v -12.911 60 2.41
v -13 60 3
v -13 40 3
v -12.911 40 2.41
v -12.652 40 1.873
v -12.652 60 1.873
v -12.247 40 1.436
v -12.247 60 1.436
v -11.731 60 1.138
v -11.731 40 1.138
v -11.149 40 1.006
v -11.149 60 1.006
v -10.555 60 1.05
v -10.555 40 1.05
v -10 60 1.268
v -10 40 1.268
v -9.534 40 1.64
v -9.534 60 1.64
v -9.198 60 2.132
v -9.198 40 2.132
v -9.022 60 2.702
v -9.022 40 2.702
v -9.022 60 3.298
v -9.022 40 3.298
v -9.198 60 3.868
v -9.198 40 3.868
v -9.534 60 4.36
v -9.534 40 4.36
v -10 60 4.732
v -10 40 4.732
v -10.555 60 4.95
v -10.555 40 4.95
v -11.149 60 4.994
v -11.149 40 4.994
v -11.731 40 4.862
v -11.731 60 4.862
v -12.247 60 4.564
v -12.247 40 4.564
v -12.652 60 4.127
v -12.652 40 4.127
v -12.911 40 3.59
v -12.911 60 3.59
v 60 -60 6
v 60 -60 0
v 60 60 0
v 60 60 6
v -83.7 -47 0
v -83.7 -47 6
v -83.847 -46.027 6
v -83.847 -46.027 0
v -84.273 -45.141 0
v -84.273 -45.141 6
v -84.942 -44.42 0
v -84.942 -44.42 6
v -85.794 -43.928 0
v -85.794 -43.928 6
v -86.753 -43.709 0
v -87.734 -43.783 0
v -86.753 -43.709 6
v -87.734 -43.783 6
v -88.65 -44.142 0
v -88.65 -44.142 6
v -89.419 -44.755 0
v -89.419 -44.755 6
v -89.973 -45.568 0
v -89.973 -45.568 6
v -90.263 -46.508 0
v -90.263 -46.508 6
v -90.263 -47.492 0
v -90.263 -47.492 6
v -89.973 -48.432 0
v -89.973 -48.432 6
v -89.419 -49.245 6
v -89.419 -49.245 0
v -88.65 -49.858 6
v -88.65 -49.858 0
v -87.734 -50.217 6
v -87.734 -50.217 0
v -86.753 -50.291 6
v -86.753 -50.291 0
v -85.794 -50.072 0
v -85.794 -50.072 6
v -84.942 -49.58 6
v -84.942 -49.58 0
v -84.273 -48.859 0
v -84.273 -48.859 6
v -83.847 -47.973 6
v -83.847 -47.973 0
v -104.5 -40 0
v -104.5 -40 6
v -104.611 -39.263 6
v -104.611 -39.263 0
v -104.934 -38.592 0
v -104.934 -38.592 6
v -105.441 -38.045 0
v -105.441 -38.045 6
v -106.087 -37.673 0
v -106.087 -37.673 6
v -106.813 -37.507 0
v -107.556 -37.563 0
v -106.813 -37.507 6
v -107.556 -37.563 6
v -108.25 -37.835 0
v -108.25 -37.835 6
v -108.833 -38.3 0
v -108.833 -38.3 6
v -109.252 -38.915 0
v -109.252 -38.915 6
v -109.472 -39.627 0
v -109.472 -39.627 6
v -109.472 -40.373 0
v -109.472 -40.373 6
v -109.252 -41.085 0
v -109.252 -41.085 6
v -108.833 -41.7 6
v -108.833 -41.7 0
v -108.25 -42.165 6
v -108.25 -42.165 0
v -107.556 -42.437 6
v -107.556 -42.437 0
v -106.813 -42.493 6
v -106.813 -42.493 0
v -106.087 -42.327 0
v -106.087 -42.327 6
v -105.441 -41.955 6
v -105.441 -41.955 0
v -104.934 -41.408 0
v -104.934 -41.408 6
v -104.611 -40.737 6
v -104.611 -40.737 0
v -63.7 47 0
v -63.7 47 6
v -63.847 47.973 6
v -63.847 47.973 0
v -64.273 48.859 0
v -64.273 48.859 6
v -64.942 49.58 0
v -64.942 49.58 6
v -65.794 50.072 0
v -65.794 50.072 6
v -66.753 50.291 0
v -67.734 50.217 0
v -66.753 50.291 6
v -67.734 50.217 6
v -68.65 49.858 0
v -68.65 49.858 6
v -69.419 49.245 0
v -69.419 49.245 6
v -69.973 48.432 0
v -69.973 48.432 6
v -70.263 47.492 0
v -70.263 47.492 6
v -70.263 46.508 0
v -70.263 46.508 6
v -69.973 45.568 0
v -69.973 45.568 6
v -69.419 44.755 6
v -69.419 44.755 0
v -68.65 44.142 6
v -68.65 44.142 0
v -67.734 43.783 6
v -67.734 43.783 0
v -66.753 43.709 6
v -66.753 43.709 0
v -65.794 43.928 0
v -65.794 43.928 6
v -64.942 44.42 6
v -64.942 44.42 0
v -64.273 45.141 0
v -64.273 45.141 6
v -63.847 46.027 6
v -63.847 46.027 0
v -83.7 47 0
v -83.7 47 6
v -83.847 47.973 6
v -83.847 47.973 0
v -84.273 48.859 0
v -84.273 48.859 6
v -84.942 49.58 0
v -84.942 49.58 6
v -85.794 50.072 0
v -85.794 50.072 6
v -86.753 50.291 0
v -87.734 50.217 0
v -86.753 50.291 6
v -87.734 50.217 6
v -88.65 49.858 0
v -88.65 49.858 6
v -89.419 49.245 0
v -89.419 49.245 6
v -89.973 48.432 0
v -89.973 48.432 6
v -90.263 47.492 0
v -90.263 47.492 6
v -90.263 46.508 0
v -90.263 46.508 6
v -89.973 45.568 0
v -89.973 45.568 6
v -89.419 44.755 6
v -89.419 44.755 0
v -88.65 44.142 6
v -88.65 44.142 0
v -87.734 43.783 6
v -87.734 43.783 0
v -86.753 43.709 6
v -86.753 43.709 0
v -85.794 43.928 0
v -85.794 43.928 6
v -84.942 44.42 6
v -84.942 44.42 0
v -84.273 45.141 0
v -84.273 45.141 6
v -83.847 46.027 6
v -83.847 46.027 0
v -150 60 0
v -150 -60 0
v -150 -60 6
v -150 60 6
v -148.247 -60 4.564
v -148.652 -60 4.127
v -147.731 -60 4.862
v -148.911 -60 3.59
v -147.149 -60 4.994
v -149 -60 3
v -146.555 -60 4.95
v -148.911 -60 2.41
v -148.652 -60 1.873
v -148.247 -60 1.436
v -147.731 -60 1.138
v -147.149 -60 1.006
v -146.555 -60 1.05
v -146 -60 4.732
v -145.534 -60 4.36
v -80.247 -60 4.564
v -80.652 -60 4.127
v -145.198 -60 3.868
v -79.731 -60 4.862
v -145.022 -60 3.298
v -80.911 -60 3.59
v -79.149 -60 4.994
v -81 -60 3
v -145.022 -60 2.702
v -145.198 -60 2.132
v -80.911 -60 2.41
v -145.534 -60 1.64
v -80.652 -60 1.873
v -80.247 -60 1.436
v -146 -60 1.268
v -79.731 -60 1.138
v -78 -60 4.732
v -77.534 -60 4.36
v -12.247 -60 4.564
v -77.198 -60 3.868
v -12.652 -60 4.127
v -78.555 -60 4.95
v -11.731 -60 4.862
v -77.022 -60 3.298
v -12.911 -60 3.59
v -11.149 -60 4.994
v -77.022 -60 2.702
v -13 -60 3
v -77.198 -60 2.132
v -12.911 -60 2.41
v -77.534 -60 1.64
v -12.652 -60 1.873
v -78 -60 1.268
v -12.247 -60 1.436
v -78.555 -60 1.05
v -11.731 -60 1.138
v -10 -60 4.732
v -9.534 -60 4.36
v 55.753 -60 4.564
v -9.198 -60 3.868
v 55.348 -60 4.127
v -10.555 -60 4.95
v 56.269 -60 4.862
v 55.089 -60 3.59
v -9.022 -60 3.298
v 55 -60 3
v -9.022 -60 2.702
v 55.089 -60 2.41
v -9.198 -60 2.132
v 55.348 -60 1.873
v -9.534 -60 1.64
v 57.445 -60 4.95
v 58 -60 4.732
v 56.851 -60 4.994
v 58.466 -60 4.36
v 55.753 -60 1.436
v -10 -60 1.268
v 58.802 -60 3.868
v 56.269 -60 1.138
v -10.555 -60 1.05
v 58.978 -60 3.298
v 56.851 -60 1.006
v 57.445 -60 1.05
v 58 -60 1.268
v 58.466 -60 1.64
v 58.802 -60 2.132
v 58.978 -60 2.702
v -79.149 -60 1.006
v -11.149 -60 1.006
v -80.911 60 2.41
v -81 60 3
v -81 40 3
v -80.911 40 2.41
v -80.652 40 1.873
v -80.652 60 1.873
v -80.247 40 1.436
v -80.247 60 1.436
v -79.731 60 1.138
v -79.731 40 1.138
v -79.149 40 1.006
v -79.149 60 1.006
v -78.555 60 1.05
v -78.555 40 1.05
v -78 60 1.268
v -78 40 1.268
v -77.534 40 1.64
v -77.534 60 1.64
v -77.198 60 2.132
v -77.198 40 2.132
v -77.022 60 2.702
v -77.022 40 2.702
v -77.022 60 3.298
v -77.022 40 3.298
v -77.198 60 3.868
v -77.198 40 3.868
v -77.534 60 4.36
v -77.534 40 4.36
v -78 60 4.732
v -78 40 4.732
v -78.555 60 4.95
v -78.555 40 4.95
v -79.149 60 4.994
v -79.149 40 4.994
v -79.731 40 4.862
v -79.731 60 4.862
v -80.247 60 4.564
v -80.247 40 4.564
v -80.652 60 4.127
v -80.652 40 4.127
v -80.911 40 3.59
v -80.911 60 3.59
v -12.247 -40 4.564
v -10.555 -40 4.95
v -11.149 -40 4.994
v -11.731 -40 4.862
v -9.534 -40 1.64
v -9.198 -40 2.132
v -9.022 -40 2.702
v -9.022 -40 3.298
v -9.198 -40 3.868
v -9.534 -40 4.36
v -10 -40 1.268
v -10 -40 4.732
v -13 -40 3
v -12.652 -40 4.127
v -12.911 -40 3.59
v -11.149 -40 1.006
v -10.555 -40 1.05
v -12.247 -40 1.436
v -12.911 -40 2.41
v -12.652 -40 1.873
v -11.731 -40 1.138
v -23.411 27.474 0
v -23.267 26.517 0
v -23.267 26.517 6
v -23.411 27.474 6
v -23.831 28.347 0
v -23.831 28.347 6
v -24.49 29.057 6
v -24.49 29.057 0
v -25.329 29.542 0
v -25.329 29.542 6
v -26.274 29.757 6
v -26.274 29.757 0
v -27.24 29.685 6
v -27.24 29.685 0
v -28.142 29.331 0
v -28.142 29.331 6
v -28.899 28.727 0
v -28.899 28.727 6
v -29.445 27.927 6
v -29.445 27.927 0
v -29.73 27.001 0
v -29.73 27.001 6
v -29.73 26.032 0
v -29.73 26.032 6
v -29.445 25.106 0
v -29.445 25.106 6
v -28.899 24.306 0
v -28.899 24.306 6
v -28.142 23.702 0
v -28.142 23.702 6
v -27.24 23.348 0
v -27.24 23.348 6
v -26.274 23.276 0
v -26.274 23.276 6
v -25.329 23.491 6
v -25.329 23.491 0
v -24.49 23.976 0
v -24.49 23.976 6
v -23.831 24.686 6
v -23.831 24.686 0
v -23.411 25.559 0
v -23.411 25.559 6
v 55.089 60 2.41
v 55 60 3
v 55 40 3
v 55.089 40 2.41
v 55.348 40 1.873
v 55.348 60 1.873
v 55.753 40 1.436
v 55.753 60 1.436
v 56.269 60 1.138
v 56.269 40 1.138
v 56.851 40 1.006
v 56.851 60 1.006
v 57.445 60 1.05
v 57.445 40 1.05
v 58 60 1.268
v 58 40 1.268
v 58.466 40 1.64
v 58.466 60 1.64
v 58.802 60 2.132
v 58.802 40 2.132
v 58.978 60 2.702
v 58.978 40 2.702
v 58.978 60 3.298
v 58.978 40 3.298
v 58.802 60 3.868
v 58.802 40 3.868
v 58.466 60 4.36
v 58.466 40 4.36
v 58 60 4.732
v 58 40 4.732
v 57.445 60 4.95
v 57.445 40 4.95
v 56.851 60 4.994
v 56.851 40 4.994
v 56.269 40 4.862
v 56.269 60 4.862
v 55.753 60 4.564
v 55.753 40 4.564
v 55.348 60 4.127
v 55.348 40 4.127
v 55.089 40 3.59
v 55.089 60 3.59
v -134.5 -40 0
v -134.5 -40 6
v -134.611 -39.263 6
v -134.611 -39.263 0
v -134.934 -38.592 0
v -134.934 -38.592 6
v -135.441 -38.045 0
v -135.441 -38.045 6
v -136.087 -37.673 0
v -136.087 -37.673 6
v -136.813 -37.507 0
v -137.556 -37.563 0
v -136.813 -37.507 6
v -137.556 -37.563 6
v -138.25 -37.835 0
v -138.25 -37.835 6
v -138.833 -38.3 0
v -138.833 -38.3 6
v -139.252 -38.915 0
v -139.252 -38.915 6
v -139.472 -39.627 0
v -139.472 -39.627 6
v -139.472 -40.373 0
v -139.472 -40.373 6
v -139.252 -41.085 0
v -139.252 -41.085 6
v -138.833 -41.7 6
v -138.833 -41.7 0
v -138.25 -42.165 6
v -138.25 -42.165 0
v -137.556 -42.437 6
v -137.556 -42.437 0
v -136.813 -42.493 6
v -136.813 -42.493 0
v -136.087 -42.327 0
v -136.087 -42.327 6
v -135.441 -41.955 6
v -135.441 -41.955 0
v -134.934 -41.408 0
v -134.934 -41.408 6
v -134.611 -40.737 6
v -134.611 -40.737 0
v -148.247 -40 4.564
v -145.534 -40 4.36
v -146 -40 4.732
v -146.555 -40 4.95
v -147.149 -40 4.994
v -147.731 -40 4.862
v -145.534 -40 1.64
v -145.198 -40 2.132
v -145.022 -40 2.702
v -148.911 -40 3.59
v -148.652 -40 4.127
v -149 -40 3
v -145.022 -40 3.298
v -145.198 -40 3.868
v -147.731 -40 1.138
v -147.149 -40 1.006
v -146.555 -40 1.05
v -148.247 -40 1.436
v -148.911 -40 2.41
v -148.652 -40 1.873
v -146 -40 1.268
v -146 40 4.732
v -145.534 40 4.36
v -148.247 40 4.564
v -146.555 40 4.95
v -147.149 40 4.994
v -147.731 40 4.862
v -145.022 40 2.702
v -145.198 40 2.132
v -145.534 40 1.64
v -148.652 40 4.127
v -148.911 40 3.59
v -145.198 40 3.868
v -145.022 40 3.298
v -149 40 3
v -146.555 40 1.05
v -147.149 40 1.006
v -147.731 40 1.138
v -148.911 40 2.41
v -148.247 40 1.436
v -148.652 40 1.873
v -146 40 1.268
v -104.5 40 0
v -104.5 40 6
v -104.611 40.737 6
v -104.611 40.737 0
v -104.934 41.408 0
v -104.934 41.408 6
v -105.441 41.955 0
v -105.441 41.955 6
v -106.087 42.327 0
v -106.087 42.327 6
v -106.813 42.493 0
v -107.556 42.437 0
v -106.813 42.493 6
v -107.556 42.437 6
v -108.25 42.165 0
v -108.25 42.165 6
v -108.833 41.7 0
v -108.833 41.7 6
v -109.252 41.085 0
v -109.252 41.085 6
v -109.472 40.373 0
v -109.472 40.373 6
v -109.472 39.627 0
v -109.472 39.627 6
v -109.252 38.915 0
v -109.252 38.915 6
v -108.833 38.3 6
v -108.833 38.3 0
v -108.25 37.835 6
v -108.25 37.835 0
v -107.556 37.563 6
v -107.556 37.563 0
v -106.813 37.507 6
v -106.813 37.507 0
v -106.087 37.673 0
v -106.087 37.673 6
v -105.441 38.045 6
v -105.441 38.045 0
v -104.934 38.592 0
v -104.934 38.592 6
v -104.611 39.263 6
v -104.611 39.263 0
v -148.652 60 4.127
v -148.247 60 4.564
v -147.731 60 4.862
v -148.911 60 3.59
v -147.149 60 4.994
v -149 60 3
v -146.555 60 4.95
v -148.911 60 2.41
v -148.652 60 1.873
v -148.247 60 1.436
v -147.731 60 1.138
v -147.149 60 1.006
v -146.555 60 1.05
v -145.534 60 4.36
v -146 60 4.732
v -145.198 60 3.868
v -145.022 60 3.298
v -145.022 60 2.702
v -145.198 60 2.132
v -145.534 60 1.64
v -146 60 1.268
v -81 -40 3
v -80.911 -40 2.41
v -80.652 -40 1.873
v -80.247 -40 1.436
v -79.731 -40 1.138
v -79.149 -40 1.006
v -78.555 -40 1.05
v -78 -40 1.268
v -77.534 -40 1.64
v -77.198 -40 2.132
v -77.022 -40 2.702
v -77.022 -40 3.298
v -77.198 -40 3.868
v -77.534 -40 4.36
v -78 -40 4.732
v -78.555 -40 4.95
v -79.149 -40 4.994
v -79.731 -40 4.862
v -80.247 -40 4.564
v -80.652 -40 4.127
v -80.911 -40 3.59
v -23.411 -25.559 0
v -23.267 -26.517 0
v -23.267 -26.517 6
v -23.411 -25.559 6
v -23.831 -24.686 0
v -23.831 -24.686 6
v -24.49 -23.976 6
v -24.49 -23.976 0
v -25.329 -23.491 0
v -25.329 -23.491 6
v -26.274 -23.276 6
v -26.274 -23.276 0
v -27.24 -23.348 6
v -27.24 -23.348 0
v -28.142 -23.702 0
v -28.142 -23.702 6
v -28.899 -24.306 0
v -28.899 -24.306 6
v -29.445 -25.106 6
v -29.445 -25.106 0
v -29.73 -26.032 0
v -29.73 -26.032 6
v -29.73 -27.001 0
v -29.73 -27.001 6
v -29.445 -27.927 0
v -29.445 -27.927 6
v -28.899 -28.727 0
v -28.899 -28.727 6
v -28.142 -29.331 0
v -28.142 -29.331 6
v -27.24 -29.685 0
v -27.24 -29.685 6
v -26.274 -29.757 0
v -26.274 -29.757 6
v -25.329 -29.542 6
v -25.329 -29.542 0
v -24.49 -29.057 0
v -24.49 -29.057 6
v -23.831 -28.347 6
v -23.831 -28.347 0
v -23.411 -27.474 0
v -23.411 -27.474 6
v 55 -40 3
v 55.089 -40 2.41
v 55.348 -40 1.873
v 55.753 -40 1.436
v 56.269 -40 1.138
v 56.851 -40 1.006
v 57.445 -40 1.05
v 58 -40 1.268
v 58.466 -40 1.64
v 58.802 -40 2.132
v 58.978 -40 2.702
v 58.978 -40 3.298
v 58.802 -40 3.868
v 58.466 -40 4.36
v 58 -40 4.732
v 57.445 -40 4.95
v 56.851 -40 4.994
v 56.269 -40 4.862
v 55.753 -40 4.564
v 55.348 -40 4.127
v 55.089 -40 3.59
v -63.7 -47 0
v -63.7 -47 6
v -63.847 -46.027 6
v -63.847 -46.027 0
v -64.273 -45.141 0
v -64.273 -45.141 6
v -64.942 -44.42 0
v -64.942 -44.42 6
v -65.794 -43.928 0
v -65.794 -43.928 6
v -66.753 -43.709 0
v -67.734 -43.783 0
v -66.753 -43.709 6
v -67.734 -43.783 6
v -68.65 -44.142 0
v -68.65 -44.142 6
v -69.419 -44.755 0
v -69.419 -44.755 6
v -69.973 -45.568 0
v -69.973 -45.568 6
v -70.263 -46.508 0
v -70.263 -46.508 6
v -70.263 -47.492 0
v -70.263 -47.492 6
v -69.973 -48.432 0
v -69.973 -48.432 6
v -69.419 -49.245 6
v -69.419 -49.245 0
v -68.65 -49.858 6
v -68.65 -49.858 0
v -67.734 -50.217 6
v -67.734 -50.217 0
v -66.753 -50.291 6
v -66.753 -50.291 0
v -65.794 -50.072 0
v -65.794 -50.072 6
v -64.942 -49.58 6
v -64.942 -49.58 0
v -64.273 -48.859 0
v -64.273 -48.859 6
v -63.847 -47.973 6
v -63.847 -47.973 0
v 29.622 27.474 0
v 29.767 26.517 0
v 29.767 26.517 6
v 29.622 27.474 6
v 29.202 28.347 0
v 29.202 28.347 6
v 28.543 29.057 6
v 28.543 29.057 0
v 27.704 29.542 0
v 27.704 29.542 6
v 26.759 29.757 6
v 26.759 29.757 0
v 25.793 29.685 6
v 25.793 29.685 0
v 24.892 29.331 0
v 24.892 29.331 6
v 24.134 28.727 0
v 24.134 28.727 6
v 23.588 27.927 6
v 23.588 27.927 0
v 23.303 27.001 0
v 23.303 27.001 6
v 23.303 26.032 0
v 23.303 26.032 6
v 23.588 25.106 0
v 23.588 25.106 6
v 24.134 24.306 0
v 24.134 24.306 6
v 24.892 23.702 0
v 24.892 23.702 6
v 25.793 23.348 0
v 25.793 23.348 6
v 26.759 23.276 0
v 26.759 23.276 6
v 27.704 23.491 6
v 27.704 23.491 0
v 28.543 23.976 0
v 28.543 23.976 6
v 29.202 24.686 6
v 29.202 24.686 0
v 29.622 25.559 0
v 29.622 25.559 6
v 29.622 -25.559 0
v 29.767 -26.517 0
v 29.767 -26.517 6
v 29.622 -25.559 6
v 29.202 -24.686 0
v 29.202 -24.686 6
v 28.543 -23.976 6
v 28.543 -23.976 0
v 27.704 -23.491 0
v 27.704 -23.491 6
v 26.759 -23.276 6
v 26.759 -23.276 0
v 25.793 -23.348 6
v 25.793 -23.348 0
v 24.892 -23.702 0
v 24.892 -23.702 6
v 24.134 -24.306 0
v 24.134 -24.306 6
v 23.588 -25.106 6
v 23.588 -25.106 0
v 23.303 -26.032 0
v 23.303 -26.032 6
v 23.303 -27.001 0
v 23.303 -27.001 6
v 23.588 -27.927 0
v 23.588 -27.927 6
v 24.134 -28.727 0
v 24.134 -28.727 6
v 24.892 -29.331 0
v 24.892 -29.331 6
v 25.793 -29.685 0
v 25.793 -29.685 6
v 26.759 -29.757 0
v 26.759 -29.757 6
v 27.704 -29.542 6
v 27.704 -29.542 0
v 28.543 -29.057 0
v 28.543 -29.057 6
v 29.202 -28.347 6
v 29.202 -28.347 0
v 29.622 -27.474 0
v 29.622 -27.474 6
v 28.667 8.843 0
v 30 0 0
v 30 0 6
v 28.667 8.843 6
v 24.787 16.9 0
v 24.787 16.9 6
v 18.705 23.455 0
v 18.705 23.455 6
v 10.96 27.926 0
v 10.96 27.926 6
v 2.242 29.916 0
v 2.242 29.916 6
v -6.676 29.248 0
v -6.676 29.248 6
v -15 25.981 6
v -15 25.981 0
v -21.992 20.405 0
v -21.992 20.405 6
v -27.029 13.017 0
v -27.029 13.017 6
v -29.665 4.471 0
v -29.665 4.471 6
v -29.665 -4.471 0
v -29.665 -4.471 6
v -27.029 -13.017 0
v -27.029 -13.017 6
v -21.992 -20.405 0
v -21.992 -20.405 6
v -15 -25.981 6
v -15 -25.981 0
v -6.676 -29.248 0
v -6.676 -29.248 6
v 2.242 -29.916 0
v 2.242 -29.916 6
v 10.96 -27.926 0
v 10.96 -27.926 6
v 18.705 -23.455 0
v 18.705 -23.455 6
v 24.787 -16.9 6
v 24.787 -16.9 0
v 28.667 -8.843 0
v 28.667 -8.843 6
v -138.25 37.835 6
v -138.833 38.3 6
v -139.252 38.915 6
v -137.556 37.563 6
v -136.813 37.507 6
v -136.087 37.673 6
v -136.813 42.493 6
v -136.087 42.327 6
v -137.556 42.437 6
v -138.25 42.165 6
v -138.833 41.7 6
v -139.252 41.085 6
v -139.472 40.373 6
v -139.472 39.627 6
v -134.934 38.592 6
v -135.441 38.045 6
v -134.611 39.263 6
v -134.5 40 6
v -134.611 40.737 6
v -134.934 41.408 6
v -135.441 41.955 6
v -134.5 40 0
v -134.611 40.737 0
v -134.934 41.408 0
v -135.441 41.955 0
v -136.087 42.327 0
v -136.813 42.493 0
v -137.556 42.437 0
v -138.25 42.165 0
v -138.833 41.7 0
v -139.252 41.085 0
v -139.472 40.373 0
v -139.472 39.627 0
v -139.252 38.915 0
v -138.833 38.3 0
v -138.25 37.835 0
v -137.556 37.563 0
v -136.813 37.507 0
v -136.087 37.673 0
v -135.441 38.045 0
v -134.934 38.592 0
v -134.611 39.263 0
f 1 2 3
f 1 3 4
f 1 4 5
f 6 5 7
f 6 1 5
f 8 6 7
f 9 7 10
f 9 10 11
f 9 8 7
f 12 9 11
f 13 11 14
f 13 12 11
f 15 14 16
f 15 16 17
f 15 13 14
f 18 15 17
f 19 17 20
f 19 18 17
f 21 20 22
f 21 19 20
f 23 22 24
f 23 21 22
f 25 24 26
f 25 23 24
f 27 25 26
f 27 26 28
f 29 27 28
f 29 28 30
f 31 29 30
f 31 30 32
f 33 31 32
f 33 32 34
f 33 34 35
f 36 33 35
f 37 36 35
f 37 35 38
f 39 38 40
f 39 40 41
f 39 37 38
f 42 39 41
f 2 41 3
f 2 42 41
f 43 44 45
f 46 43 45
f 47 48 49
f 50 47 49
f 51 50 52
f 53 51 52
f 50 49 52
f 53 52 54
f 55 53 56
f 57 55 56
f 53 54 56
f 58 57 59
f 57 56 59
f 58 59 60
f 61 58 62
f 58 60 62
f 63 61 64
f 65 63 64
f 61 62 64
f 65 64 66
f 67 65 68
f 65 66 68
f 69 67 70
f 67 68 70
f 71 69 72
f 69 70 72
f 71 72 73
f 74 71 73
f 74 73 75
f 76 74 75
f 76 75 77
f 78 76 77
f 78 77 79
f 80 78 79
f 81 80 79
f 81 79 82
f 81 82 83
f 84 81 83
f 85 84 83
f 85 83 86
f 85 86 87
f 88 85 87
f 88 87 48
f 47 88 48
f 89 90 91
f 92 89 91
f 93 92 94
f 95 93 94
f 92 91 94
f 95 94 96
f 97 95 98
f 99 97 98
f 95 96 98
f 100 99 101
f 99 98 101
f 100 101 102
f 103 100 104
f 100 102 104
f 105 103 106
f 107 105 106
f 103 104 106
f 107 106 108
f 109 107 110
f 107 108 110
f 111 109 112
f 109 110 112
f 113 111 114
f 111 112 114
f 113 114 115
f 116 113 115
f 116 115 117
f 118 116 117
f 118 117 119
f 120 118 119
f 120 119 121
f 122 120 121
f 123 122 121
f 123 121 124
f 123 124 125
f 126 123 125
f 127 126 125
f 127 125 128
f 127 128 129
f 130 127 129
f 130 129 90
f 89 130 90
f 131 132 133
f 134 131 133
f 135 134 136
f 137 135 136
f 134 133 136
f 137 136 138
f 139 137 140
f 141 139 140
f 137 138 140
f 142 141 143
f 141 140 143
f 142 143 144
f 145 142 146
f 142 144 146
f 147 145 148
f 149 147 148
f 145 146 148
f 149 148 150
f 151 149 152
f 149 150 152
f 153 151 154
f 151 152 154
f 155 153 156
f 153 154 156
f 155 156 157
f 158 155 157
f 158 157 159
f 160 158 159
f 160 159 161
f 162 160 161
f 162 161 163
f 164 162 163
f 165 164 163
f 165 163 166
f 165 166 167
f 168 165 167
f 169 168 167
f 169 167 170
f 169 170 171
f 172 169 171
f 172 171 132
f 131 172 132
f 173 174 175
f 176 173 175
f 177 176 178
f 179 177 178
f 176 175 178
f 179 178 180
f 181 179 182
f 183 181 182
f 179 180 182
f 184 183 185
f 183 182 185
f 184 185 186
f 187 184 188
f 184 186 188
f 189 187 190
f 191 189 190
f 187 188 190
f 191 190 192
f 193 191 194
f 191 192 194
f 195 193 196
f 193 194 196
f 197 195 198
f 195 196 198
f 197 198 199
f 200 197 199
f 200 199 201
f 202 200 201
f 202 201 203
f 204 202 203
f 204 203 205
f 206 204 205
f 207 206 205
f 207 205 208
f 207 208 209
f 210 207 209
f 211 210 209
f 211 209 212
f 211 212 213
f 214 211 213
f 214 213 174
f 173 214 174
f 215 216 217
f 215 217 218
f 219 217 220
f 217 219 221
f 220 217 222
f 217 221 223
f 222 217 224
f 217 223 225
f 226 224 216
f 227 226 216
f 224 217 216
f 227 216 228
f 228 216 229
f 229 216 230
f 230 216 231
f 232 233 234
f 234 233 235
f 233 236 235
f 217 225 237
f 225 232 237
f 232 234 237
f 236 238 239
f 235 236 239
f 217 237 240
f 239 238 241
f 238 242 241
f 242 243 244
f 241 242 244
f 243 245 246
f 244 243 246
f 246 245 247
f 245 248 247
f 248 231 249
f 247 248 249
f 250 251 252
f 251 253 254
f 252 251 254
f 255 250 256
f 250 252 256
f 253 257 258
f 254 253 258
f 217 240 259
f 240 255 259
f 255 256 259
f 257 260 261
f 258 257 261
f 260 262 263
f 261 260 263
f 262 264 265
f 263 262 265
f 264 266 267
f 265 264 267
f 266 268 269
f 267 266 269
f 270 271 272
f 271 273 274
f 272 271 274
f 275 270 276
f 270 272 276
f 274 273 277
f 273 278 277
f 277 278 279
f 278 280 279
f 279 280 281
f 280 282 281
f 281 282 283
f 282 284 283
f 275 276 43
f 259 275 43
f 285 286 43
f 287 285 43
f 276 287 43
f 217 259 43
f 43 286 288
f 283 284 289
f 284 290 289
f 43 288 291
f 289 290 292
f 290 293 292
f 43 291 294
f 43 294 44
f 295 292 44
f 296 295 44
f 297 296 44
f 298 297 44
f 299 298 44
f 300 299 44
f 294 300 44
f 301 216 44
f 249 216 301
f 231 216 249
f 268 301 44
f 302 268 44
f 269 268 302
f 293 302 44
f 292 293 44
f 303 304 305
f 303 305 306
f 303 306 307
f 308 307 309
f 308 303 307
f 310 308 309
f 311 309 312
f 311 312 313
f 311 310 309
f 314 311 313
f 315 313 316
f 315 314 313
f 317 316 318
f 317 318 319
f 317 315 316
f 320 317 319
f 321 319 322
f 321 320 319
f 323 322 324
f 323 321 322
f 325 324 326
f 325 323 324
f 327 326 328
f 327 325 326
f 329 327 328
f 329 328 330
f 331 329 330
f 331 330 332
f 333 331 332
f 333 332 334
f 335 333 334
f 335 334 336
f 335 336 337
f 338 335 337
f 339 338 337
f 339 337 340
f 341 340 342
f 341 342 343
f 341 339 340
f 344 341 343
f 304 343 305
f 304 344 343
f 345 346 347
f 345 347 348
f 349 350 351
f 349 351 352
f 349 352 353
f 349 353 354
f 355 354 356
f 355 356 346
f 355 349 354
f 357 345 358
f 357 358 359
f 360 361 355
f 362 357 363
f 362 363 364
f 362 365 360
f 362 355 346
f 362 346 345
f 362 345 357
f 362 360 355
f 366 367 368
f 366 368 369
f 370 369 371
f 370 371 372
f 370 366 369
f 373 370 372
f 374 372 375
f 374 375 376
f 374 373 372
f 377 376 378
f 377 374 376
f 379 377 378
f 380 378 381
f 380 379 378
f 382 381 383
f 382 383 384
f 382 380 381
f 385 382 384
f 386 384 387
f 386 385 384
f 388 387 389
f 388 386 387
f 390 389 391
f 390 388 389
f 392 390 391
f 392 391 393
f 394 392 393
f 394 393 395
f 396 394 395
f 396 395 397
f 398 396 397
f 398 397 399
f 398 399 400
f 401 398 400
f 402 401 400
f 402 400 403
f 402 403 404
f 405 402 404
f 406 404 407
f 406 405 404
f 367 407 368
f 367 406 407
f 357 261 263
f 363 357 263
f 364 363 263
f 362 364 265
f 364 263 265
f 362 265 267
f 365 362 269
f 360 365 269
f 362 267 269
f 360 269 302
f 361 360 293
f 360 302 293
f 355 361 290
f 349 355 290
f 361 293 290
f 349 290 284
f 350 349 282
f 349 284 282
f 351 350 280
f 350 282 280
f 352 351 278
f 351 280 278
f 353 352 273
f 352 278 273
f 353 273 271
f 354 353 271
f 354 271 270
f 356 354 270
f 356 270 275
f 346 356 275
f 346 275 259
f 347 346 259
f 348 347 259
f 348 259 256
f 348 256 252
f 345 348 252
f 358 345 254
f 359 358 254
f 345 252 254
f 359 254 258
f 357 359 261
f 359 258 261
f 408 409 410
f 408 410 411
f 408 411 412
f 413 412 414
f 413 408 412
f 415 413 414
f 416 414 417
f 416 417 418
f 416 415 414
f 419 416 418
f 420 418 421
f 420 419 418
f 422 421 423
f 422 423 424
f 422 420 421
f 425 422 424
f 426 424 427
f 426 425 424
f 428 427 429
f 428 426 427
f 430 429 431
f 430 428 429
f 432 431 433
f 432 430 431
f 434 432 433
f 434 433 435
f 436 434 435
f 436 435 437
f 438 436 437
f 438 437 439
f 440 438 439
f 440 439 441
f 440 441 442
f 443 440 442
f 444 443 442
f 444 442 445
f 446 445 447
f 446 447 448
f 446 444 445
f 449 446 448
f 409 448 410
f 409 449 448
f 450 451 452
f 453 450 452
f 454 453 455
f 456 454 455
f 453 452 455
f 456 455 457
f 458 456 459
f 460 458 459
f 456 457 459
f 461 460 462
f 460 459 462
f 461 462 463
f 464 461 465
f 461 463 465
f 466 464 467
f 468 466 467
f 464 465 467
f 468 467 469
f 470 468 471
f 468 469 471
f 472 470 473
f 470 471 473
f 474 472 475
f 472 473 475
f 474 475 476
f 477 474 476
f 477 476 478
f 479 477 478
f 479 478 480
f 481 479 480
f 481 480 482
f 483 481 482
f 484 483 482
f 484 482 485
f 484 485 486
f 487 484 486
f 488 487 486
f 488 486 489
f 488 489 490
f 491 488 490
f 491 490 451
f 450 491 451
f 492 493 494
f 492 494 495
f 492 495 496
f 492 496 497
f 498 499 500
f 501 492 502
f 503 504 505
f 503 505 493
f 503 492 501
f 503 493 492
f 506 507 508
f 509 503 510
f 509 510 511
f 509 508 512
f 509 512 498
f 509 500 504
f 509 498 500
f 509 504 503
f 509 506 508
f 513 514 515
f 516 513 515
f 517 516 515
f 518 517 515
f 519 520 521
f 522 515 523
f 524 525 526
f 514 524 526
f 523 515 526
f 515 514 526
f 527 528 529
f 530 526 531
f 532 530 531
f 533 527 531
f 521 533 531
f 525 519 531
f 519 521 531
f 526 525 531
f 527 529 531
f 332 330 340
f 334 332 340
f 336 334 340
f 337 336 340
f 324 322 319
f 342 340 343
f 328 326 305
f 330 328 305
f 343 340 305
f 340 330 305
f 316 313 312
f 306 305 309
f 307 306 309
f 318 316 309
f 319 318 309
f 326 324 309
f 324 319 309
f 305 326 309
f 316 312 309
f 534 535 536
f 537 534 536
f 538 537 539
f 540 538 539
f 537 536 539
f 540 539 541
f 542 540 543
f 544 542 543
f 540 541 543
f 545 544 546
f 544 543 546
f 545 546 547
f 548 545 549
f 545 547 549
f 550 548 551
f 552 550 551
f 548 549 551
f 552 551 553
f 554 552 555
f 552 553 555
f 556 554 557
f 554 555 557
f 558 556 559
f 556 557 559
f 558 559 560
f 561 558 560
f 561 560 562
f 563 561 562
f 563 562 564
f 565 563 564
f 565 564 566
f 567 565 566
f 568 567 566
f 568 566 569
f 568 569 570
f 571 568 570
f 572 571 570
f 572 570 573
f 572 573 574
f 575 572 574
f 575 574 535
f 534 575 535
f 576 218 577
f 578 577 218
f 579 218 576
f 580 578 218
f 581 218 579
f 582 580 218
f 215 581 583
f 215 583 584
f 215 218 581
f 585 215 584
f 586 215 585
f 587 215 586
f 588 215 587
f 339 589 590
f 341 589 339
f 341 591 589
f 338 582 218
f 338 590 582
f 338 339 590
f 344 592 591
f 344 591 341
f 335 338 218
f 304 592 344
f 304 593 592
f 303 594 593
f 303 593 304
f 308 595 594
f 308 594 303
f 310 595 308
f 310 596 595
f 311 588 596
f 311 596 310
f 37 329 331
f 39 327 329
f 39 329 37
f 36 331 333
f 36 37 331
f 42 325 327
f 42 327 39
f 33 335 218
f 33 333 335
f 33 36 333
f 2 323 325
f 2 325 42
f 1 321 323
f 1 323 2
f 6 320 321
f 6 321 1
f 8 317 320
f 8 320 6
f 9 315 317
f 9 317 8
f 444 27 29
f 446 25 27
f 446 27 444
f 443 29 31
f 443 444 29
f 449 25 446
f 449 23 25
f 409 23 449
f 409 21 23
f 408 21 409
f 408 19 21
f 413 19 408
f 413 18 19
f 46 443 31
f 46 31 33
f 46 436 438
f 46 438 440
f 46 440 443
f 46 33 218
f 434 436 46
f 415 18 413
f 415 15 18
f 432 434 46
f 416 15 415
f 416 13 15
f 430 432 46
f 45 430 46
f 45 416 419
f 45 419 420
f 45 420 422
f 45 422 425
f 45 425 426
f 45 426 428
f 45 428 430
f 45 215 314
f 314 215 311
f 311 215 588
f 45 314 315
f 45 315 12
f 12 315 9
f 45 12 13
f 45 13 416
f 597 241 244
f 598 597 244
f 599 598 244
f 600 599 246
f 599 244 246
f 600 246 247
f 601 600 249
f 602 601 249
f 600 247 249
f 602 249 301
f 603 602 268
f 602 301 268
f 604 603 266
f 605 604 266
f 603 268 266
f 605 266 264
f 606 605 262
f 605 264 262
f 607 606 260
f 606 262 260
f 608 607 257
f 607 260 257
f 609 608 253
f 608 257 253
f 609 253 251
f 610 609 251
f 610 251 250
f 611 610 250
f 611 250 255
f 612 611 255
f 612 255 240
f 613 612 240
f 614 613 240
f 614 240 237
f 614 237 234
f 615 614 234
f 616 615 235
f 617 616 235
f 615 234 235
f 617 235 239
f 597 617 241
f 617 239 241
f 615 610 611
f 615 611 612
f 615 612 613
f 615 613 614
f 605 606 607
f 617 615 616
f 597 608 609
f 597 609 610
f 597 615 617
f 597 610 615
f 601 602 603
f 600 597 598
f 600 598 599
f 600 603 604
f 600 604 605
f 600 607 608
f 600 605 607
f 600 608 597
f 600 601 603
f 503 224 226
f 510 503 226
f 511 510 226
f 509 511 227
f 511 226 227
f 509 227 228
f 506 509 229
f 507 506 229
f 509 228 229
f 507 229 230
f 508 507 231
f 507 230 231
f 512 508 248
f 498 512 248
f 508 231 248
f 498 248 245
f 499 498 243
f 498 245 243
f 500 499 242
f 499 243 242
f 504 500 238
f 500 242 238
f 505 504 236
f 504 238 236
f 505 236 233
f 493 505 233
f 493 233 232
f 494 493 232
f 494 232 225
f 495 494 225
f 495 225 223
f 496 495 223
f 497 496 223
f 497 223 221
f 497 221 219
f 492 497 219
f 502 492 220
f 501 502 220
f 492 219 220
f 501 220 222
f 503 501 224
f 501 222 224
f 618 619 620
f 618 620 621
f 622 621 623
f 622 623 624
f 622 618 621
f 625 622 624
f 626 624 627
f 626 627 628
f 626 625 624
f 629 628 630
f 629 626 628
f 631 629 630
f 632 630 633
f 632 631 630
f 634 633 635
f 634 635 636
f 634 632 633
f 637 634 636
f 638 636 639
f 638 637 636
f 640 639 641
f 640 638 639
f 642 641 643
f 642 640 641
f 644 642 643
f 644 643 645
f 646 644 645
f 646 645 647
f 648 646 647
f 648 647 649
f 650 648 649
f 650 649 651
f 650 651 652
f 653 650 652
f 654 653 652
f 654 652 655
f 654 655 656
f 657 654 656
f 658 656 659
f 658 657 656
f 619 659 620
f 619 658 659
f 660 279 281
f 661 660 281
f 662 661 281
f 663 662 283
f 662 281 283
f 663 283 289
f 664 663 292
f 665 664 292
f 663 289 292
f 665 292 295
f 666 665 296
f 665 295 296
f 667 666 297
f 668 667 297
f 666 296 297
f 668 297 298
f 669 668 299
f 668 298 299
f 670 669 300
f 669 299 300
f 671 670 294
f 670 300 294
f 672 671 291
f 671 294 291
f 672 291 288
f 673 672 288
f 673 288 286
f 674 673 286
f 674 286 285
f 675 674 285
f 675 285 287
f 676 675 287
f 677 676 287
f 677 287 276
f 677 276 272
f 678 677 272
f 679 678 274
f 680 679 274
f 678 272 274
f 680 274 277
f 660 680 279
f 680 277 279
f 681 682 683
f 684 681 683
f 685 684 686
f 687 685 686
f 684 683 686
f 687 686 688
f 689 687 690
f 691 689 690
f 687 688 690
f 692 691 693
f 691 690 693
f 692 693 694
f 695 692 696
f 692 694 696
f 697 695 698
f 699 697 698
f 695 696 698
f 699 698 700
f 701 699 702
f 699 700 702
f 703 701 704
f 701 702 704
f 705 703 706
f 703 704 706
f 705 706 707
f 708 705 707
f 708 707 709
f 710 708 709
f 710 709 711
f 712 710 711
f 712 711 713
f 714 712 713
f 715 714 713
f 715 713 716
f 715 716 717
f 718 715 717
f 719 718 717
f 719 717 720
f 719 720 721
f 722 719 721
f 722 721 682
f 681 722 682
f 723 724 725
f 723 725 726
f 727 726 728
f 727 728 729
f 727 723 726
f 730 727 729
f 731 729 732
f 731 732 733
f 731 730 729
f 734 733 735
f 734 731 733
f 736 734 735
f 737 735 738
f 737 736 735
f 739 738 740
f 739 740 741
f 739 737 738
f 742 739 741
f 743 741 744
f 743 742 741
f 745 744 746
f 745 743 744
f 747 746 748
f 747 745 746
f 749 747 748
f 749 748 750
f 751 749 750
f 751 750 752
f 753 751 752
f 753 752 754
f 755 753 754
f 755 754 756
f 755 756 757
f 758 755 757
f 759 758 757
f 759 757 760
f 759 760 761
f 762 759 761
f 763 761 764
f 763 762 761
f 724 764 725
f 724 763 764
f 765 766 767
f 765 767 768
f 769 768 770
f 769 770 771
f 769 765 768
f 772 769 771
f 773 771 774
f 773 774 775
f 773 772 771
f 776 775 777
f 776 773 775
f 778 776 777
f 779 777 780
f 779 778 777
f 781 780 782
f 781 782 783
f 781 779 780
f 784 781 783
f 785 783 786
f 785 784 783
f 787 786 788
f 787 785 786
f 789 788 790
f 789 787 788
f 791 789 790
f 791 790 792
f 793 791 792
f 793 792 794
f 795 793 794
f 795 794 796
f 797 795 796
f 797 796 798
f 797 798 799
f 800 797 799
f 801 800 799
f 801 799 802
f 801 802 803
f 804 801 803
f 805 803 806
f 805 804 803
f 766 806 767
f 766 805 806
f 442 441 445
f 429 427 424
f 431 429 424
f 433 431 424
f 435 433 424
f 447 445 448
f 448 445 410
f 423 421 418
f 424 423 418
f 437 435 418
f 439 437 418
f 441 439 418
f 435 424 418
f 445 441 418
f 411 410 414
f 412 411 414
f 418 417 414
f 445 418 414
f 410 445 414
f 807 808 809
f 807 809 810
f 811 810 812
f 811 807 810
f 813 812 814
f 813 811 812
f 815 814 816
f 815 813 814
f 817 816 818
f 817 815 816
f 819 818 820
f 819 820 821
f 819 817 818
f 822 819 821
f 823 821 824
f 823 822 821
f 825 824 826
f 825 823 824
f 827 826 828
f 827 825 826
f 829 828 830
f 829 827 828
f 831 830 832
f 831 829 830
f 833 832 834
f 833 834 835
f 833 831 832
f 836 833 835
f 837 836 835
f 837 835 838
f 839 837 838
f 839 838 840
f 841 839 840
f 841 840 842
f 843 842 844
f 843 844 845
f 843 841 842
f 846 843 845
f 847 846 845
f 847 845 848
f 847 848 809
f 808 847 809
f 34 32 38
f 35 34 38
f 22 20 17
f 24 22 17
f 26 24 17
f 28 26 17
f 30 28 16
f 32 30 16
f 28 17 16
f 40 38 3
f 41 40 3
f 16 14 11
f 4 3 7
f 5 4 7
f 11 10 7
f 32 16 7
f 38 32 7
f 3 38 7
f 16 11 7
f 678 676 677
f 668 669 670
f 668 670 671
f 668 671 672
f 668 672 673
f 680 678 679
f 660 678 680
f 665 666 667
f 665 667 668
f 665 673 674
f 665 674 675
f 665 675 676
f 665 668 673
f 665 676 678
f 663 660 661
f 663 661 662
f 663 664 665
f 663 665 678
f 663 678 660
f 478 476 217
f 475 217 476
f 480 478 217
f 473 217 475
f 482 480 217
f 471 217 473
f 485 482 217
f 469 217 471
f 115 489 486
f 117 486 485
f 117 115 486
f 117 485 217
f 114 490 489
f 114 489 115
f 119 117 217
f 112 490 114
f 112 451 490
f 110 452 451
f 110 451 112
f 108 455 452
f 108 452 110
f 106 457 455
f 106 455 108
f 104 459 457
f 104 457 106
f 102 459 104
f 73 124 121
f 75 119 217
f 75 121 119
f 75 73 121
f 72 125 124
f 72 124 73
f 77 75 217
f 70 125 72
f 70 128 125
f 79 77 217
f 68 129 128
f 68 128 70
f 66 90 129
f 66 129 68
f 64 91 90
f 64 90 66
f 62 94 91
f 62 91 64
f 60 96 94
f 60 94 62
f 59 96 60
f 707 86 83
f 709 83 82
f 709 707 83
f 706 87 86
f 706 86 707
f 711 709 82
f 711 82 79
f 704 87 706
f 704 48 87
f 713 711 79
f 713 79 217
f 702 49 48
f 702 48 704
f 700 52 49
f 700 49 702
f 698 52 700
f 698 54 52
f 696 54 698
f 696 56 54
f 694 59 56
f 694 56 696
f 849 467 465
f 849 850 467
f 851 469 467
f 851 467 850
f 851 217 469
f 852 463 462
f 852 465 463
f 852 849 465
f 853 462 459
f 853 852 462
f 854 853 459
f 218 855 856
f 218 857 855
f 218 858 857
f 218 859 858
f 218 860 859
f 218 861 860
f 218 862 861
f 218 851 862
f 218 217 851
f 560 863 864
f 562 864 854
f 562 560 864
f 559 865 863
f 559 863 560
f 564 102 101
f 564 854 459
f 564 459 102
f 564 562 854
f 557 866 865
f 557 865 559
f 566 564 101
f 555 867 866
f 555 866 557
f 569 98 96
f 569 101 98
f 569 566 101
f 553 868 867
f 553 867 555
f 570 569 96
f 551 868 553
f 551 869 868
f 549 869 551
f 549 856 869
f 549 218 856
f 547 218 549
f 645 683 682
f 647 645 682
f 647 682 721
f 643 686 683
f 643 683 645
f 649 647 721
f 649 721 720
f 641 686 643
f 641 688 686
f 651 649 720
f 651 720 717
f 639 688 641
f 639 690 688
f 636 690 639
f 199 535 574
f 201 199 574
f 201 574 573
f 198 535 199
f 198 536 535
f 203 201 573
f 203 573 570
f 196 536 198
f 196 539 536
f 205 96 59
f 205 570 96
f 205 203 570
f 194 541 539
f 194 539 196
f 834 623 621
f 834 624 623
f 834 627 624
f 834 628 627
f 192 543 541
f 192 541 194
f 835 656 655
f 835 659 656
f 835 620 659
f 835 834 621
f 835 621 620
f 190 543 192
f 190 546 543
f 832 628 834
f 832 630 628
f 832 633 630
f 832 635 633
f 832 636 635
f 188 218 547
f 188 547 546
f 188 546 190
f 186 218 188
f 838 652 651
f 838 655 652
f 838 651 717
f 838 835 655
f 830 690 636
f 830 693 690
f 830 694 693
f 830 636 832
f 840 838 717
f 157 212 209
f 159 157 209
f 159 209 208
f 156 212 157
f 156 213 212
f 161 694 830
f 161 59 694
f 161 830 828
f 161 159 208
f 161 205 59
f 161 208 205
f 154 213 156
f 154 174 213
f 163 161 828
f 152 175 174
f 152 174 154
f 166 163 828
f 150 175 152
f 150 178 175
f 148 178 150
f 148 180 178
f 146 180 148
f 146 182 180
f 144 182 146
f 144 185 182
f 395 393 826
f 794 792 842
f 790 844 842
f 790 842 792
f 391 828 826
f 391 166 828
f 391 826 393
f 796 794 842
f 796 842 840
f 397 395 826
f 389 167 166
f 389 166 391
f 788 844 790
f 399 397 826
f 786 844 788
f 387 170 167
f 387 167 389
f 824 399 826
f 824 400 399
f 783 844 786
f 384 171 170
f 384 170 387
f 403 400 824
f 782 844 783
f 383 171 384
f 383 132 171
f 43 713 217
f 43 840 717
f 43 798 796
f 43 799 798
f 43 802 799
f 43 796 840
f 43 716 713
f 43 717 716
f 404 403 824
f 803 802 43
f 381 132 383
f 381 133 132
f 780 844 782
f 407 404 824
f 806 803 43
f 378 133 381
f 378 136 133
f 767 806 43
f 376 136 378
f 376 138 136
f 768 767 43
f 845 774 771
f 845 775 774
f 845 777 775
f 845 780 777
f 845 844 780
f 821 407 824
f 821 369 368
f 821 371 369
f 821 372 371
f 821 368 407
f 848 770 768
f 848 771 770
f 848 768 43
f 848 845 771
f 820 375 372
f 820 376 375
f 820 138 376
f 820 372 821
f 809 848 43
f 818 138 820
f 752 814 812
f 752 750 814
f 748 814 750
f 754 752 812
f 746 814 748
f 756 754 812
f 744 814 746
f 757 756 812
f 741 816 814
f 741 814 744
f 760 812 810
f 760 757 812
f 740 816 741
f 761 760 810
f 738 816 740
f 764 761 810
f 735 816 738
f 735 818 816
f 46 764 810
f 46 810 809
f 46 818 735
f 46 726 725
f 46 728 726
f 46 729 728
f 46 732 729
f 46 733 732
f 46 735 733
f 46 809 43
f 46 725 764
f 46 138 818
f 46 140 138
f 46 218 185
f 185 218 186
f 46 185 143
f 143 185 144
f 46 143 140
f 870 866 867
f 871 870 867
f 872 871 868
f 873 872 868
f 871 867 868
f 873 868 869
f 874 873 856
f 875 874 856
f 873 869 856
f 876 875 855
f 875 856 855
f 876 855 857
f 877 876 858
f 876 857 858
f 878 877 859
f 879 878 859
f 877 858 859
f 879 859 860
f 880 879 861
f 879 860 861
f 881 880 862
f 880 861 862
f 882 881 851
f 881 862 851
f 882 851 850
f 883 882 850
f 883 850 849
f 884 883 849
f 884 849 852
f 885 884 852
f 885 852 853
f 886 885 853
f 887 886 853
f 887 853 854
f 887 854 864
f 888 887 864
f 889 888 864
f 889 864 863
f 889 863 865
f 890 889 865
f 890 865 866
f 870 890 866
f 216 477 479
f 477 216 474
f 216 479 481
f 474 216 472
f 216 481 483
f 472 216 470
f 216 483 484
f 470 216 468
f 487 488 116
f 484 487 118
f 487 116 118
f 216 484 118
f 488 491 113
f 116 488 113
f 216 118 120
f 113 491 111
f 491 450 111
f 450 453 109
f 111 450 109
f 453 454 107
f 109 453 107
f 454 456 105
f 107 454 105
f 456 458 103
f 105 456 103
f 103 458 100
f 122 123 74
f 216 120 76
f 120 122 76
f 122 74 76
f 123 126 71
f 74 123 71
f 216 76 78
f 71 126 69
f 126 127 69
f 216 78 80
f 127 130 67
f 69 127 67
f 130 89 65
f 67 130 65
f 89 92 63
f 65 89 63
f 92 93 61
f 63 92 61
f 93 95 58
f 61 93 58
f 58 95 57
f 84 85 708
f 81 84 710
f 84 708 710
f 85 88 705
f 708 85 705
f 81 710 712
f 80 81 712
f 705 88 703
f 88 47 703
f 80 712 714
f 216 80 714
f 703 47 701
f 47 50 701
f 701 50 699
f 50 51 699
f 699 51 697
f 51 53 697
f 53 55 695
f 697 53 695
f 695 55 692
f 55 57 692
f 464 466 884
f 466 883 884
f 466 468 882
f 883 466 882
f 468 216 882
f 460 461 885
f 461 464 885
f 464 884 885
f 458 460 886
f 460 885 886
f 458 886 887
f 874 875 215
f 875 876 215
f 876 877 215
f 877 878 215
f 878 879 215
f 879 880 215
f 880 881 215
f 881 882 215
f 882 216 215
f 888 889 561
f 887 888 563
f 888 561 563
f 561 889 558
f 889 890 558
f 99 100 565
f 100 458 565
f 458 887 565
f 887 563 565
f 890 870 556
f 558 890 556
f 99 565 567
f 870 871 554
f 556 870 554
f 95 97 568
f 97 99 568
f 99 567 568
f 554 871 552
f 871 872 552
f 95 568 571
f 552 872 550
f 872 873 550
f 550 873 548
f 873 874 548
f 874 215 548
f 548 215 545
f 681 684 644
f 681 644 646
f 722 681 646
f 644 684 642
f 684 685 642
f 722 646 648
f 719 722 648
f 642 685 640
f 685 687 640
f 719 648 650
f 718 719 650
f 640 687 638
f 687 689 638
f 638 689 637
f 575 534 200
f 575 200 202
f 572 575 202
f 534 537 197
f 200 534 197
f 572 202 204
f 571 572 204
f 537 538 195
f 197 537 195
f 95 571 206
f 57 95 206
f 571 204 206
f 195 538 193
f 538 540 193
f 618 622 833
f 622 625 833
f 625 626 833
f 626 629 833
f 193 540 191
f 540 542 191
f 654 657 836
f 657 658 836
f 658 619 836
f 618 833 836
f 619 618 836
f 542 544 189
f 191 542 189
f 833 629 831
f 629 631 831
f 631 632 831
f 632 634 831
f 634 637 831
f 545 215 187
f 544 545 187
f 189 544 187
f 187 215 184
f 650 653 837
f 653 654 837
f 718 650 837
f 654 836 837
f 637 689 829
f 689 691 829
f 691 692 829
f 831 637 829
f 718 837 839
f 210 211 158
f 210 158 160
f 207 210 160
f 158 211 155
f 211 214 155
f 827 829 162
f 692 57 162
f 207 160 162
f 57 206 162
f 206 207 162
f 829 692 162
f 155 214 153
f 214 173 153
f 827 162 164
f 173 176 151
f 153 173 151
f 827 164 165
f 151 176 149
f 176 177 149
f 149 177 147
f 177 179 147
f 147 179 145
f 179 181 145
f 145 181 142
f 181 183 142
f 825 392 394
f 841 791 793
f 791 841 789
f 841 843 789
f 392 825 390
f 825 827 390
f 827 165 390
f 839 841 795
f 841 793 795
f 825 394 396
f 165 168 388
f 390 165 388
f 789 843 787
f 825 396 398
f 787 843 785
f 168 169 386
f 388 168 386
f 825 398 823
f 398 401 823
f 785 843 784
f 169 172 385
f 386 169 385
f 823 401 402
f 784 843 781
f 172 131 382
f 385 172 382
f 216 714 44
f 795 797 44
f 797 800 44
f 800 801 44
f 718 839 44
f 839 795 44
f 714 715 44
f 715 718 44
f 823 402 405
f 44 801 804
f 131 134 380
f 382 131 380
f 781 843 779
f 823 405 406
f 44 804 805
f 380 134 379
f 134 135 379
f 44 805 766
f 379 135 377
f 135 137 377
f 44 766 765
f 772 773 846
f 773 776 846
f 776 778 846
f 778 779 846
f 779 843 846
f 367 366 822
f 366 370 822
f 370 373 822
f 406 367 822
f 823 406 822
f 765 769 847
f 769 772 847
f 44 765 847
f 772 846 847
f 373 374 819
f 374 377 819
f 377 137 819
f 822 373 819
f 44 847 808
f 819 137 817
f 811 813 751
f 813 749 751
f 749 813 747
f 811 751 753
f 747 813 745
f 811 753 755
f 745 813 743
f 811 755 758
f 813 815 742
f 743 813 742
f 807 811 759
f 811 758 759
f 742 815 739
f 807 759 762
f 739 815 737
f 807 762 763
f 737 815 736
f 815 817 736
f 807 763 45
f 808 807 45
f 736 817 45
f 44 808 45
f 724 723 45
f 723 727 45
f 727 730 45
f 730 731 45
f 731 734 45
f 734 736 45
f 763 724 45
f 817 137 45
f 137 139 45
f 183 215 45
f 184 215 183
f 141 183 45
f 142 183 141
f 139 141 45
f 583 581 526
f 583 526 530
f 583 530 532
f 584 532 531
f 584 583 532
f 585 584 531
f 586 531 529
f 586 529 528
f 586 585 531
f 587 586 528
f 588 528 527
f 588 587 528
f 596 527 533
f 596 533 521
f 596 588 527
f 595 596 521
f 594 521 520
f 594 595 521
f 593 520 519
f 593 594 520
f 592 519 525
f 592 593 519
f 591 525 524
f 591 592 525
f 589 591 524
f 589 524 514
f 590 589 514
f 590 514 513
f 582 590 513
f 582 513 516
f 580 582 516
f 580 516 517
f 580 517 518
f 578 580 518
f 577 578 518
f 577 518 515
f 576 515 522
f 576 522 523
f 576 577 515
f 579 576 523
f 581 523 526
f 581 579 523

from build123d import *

# Parameters (mm, degrees)
SKETCH_1_W          = 210
SKETCH_1_H          = 120
SKETCH_1_R          = 3.25
SKETCH_1_R_2        = 30
EXTRUDE_1_DEPTH     = 6
SKETCH_2_R          = 2.5
CUT_EXTRUDE_1_DEPTH = 10
SKETCH_3_R          = 2
CUT_EXTRUDE_2_DEPTH = 20
SKETCH_4_R          = 3.3
CUT_EXTRUDE_3_DEPTH = 10


with BuildPart() as part:
    # 草图1 → 凸台-拉伸1 (new body)
    with BuildSketch(Plane.XY):
        with Locations((-45, 0)):
            Rectangle(SKETCH_1_W, SKETCH_1_H)
        with Locations((26.516504294, 26.516504294)):
            Circle(SKETCH_1_R, mode=Mode.SUBTRACT)
        with Locations((26.516504294, -26.516504294)):
            Circle(SKETCH_1_R, mode=Mode.SUBTRACT)
        with Locations((-26.516504294, -26.516504294)):
            Circle(SKETCH_1_R, mode=Mode.SUBTRACT)
        with Locations((-26.516504294, 26.516504294)):
            Circle(SKETCH_1_R, mode=Mode.SUBTRACT)
        Circle(SKETCH_1_R_2, mode=Mode.SUBTRACT)
    extrude(amount=EXTRUDE_1_DEPTH)

    # 草图2 → 切除-拉伸1 (cut)
    with BuildSketch(Plane.XY.offset(6)):
        with Locations((-137, 40)):
            Circle(SKETCH_2_R)
        with Locations((-107, 40)):
            Circle(SKETCH_2_R)
        with Locations((-107, -40)):
            Circle(SKETCH_2_R)
        with Locations((-137, -40)):
            Circle(SKETCH_2_R)
    extrude(amount=-CUT_EXTRUDE_1_DEPTH, mode=Mode.SUBTRACT)

    # 草图3 → 切除-拉伸2 (cut)
    with BuildSketch(Plane(origin=(0, -60, 0), x_dir=(-1, 0, 0), z_dir=(0, -1, 0))):
        with Locations((-57, -3)):
            Circle(SKETCH_3_R)
        with Locations((11, -3)):
            Circle(SKETCH_3_R)
        with Locations((79, -3)):
            Circle(SKETCH_3_R)
        with Locations((147, -3)):
            Circle(SKETCH_3_R)
    cut_extrude_2 = extrude(amount=-CUT_EXTRUDE_2_DEPTH, mode=Mode.SUBTRACT)

    # 镜向3: 切除-拉伸2 across plane
    add(cut_extrude_2.mirror(Plane(origin=(0, 0, 0), x_dir=(0, 0, 1), z_dir=(0, -1, 0))), mode=Mode.SUBTRACT)

    # 草图4 → 切除-拉伸3 (cut)
    with BuildSketch(Plane.XY.offset(6)):
        with Locations((-87, 47)):
            Circle(SKETCH_4_R)
        with Locations((-67, 47)):
            Circle(SKETCH_4_R)
        with Locations((-67, -47)):
            Circle(SKETCH_4_R)
        with Locations((-87, -47)):
            Circle(SKETCH_4_R)
    extrude(amount=-CUT_EXTRUDE_3_DEPTH, mode=Mode.SUBTRACT)


solid = part.part
